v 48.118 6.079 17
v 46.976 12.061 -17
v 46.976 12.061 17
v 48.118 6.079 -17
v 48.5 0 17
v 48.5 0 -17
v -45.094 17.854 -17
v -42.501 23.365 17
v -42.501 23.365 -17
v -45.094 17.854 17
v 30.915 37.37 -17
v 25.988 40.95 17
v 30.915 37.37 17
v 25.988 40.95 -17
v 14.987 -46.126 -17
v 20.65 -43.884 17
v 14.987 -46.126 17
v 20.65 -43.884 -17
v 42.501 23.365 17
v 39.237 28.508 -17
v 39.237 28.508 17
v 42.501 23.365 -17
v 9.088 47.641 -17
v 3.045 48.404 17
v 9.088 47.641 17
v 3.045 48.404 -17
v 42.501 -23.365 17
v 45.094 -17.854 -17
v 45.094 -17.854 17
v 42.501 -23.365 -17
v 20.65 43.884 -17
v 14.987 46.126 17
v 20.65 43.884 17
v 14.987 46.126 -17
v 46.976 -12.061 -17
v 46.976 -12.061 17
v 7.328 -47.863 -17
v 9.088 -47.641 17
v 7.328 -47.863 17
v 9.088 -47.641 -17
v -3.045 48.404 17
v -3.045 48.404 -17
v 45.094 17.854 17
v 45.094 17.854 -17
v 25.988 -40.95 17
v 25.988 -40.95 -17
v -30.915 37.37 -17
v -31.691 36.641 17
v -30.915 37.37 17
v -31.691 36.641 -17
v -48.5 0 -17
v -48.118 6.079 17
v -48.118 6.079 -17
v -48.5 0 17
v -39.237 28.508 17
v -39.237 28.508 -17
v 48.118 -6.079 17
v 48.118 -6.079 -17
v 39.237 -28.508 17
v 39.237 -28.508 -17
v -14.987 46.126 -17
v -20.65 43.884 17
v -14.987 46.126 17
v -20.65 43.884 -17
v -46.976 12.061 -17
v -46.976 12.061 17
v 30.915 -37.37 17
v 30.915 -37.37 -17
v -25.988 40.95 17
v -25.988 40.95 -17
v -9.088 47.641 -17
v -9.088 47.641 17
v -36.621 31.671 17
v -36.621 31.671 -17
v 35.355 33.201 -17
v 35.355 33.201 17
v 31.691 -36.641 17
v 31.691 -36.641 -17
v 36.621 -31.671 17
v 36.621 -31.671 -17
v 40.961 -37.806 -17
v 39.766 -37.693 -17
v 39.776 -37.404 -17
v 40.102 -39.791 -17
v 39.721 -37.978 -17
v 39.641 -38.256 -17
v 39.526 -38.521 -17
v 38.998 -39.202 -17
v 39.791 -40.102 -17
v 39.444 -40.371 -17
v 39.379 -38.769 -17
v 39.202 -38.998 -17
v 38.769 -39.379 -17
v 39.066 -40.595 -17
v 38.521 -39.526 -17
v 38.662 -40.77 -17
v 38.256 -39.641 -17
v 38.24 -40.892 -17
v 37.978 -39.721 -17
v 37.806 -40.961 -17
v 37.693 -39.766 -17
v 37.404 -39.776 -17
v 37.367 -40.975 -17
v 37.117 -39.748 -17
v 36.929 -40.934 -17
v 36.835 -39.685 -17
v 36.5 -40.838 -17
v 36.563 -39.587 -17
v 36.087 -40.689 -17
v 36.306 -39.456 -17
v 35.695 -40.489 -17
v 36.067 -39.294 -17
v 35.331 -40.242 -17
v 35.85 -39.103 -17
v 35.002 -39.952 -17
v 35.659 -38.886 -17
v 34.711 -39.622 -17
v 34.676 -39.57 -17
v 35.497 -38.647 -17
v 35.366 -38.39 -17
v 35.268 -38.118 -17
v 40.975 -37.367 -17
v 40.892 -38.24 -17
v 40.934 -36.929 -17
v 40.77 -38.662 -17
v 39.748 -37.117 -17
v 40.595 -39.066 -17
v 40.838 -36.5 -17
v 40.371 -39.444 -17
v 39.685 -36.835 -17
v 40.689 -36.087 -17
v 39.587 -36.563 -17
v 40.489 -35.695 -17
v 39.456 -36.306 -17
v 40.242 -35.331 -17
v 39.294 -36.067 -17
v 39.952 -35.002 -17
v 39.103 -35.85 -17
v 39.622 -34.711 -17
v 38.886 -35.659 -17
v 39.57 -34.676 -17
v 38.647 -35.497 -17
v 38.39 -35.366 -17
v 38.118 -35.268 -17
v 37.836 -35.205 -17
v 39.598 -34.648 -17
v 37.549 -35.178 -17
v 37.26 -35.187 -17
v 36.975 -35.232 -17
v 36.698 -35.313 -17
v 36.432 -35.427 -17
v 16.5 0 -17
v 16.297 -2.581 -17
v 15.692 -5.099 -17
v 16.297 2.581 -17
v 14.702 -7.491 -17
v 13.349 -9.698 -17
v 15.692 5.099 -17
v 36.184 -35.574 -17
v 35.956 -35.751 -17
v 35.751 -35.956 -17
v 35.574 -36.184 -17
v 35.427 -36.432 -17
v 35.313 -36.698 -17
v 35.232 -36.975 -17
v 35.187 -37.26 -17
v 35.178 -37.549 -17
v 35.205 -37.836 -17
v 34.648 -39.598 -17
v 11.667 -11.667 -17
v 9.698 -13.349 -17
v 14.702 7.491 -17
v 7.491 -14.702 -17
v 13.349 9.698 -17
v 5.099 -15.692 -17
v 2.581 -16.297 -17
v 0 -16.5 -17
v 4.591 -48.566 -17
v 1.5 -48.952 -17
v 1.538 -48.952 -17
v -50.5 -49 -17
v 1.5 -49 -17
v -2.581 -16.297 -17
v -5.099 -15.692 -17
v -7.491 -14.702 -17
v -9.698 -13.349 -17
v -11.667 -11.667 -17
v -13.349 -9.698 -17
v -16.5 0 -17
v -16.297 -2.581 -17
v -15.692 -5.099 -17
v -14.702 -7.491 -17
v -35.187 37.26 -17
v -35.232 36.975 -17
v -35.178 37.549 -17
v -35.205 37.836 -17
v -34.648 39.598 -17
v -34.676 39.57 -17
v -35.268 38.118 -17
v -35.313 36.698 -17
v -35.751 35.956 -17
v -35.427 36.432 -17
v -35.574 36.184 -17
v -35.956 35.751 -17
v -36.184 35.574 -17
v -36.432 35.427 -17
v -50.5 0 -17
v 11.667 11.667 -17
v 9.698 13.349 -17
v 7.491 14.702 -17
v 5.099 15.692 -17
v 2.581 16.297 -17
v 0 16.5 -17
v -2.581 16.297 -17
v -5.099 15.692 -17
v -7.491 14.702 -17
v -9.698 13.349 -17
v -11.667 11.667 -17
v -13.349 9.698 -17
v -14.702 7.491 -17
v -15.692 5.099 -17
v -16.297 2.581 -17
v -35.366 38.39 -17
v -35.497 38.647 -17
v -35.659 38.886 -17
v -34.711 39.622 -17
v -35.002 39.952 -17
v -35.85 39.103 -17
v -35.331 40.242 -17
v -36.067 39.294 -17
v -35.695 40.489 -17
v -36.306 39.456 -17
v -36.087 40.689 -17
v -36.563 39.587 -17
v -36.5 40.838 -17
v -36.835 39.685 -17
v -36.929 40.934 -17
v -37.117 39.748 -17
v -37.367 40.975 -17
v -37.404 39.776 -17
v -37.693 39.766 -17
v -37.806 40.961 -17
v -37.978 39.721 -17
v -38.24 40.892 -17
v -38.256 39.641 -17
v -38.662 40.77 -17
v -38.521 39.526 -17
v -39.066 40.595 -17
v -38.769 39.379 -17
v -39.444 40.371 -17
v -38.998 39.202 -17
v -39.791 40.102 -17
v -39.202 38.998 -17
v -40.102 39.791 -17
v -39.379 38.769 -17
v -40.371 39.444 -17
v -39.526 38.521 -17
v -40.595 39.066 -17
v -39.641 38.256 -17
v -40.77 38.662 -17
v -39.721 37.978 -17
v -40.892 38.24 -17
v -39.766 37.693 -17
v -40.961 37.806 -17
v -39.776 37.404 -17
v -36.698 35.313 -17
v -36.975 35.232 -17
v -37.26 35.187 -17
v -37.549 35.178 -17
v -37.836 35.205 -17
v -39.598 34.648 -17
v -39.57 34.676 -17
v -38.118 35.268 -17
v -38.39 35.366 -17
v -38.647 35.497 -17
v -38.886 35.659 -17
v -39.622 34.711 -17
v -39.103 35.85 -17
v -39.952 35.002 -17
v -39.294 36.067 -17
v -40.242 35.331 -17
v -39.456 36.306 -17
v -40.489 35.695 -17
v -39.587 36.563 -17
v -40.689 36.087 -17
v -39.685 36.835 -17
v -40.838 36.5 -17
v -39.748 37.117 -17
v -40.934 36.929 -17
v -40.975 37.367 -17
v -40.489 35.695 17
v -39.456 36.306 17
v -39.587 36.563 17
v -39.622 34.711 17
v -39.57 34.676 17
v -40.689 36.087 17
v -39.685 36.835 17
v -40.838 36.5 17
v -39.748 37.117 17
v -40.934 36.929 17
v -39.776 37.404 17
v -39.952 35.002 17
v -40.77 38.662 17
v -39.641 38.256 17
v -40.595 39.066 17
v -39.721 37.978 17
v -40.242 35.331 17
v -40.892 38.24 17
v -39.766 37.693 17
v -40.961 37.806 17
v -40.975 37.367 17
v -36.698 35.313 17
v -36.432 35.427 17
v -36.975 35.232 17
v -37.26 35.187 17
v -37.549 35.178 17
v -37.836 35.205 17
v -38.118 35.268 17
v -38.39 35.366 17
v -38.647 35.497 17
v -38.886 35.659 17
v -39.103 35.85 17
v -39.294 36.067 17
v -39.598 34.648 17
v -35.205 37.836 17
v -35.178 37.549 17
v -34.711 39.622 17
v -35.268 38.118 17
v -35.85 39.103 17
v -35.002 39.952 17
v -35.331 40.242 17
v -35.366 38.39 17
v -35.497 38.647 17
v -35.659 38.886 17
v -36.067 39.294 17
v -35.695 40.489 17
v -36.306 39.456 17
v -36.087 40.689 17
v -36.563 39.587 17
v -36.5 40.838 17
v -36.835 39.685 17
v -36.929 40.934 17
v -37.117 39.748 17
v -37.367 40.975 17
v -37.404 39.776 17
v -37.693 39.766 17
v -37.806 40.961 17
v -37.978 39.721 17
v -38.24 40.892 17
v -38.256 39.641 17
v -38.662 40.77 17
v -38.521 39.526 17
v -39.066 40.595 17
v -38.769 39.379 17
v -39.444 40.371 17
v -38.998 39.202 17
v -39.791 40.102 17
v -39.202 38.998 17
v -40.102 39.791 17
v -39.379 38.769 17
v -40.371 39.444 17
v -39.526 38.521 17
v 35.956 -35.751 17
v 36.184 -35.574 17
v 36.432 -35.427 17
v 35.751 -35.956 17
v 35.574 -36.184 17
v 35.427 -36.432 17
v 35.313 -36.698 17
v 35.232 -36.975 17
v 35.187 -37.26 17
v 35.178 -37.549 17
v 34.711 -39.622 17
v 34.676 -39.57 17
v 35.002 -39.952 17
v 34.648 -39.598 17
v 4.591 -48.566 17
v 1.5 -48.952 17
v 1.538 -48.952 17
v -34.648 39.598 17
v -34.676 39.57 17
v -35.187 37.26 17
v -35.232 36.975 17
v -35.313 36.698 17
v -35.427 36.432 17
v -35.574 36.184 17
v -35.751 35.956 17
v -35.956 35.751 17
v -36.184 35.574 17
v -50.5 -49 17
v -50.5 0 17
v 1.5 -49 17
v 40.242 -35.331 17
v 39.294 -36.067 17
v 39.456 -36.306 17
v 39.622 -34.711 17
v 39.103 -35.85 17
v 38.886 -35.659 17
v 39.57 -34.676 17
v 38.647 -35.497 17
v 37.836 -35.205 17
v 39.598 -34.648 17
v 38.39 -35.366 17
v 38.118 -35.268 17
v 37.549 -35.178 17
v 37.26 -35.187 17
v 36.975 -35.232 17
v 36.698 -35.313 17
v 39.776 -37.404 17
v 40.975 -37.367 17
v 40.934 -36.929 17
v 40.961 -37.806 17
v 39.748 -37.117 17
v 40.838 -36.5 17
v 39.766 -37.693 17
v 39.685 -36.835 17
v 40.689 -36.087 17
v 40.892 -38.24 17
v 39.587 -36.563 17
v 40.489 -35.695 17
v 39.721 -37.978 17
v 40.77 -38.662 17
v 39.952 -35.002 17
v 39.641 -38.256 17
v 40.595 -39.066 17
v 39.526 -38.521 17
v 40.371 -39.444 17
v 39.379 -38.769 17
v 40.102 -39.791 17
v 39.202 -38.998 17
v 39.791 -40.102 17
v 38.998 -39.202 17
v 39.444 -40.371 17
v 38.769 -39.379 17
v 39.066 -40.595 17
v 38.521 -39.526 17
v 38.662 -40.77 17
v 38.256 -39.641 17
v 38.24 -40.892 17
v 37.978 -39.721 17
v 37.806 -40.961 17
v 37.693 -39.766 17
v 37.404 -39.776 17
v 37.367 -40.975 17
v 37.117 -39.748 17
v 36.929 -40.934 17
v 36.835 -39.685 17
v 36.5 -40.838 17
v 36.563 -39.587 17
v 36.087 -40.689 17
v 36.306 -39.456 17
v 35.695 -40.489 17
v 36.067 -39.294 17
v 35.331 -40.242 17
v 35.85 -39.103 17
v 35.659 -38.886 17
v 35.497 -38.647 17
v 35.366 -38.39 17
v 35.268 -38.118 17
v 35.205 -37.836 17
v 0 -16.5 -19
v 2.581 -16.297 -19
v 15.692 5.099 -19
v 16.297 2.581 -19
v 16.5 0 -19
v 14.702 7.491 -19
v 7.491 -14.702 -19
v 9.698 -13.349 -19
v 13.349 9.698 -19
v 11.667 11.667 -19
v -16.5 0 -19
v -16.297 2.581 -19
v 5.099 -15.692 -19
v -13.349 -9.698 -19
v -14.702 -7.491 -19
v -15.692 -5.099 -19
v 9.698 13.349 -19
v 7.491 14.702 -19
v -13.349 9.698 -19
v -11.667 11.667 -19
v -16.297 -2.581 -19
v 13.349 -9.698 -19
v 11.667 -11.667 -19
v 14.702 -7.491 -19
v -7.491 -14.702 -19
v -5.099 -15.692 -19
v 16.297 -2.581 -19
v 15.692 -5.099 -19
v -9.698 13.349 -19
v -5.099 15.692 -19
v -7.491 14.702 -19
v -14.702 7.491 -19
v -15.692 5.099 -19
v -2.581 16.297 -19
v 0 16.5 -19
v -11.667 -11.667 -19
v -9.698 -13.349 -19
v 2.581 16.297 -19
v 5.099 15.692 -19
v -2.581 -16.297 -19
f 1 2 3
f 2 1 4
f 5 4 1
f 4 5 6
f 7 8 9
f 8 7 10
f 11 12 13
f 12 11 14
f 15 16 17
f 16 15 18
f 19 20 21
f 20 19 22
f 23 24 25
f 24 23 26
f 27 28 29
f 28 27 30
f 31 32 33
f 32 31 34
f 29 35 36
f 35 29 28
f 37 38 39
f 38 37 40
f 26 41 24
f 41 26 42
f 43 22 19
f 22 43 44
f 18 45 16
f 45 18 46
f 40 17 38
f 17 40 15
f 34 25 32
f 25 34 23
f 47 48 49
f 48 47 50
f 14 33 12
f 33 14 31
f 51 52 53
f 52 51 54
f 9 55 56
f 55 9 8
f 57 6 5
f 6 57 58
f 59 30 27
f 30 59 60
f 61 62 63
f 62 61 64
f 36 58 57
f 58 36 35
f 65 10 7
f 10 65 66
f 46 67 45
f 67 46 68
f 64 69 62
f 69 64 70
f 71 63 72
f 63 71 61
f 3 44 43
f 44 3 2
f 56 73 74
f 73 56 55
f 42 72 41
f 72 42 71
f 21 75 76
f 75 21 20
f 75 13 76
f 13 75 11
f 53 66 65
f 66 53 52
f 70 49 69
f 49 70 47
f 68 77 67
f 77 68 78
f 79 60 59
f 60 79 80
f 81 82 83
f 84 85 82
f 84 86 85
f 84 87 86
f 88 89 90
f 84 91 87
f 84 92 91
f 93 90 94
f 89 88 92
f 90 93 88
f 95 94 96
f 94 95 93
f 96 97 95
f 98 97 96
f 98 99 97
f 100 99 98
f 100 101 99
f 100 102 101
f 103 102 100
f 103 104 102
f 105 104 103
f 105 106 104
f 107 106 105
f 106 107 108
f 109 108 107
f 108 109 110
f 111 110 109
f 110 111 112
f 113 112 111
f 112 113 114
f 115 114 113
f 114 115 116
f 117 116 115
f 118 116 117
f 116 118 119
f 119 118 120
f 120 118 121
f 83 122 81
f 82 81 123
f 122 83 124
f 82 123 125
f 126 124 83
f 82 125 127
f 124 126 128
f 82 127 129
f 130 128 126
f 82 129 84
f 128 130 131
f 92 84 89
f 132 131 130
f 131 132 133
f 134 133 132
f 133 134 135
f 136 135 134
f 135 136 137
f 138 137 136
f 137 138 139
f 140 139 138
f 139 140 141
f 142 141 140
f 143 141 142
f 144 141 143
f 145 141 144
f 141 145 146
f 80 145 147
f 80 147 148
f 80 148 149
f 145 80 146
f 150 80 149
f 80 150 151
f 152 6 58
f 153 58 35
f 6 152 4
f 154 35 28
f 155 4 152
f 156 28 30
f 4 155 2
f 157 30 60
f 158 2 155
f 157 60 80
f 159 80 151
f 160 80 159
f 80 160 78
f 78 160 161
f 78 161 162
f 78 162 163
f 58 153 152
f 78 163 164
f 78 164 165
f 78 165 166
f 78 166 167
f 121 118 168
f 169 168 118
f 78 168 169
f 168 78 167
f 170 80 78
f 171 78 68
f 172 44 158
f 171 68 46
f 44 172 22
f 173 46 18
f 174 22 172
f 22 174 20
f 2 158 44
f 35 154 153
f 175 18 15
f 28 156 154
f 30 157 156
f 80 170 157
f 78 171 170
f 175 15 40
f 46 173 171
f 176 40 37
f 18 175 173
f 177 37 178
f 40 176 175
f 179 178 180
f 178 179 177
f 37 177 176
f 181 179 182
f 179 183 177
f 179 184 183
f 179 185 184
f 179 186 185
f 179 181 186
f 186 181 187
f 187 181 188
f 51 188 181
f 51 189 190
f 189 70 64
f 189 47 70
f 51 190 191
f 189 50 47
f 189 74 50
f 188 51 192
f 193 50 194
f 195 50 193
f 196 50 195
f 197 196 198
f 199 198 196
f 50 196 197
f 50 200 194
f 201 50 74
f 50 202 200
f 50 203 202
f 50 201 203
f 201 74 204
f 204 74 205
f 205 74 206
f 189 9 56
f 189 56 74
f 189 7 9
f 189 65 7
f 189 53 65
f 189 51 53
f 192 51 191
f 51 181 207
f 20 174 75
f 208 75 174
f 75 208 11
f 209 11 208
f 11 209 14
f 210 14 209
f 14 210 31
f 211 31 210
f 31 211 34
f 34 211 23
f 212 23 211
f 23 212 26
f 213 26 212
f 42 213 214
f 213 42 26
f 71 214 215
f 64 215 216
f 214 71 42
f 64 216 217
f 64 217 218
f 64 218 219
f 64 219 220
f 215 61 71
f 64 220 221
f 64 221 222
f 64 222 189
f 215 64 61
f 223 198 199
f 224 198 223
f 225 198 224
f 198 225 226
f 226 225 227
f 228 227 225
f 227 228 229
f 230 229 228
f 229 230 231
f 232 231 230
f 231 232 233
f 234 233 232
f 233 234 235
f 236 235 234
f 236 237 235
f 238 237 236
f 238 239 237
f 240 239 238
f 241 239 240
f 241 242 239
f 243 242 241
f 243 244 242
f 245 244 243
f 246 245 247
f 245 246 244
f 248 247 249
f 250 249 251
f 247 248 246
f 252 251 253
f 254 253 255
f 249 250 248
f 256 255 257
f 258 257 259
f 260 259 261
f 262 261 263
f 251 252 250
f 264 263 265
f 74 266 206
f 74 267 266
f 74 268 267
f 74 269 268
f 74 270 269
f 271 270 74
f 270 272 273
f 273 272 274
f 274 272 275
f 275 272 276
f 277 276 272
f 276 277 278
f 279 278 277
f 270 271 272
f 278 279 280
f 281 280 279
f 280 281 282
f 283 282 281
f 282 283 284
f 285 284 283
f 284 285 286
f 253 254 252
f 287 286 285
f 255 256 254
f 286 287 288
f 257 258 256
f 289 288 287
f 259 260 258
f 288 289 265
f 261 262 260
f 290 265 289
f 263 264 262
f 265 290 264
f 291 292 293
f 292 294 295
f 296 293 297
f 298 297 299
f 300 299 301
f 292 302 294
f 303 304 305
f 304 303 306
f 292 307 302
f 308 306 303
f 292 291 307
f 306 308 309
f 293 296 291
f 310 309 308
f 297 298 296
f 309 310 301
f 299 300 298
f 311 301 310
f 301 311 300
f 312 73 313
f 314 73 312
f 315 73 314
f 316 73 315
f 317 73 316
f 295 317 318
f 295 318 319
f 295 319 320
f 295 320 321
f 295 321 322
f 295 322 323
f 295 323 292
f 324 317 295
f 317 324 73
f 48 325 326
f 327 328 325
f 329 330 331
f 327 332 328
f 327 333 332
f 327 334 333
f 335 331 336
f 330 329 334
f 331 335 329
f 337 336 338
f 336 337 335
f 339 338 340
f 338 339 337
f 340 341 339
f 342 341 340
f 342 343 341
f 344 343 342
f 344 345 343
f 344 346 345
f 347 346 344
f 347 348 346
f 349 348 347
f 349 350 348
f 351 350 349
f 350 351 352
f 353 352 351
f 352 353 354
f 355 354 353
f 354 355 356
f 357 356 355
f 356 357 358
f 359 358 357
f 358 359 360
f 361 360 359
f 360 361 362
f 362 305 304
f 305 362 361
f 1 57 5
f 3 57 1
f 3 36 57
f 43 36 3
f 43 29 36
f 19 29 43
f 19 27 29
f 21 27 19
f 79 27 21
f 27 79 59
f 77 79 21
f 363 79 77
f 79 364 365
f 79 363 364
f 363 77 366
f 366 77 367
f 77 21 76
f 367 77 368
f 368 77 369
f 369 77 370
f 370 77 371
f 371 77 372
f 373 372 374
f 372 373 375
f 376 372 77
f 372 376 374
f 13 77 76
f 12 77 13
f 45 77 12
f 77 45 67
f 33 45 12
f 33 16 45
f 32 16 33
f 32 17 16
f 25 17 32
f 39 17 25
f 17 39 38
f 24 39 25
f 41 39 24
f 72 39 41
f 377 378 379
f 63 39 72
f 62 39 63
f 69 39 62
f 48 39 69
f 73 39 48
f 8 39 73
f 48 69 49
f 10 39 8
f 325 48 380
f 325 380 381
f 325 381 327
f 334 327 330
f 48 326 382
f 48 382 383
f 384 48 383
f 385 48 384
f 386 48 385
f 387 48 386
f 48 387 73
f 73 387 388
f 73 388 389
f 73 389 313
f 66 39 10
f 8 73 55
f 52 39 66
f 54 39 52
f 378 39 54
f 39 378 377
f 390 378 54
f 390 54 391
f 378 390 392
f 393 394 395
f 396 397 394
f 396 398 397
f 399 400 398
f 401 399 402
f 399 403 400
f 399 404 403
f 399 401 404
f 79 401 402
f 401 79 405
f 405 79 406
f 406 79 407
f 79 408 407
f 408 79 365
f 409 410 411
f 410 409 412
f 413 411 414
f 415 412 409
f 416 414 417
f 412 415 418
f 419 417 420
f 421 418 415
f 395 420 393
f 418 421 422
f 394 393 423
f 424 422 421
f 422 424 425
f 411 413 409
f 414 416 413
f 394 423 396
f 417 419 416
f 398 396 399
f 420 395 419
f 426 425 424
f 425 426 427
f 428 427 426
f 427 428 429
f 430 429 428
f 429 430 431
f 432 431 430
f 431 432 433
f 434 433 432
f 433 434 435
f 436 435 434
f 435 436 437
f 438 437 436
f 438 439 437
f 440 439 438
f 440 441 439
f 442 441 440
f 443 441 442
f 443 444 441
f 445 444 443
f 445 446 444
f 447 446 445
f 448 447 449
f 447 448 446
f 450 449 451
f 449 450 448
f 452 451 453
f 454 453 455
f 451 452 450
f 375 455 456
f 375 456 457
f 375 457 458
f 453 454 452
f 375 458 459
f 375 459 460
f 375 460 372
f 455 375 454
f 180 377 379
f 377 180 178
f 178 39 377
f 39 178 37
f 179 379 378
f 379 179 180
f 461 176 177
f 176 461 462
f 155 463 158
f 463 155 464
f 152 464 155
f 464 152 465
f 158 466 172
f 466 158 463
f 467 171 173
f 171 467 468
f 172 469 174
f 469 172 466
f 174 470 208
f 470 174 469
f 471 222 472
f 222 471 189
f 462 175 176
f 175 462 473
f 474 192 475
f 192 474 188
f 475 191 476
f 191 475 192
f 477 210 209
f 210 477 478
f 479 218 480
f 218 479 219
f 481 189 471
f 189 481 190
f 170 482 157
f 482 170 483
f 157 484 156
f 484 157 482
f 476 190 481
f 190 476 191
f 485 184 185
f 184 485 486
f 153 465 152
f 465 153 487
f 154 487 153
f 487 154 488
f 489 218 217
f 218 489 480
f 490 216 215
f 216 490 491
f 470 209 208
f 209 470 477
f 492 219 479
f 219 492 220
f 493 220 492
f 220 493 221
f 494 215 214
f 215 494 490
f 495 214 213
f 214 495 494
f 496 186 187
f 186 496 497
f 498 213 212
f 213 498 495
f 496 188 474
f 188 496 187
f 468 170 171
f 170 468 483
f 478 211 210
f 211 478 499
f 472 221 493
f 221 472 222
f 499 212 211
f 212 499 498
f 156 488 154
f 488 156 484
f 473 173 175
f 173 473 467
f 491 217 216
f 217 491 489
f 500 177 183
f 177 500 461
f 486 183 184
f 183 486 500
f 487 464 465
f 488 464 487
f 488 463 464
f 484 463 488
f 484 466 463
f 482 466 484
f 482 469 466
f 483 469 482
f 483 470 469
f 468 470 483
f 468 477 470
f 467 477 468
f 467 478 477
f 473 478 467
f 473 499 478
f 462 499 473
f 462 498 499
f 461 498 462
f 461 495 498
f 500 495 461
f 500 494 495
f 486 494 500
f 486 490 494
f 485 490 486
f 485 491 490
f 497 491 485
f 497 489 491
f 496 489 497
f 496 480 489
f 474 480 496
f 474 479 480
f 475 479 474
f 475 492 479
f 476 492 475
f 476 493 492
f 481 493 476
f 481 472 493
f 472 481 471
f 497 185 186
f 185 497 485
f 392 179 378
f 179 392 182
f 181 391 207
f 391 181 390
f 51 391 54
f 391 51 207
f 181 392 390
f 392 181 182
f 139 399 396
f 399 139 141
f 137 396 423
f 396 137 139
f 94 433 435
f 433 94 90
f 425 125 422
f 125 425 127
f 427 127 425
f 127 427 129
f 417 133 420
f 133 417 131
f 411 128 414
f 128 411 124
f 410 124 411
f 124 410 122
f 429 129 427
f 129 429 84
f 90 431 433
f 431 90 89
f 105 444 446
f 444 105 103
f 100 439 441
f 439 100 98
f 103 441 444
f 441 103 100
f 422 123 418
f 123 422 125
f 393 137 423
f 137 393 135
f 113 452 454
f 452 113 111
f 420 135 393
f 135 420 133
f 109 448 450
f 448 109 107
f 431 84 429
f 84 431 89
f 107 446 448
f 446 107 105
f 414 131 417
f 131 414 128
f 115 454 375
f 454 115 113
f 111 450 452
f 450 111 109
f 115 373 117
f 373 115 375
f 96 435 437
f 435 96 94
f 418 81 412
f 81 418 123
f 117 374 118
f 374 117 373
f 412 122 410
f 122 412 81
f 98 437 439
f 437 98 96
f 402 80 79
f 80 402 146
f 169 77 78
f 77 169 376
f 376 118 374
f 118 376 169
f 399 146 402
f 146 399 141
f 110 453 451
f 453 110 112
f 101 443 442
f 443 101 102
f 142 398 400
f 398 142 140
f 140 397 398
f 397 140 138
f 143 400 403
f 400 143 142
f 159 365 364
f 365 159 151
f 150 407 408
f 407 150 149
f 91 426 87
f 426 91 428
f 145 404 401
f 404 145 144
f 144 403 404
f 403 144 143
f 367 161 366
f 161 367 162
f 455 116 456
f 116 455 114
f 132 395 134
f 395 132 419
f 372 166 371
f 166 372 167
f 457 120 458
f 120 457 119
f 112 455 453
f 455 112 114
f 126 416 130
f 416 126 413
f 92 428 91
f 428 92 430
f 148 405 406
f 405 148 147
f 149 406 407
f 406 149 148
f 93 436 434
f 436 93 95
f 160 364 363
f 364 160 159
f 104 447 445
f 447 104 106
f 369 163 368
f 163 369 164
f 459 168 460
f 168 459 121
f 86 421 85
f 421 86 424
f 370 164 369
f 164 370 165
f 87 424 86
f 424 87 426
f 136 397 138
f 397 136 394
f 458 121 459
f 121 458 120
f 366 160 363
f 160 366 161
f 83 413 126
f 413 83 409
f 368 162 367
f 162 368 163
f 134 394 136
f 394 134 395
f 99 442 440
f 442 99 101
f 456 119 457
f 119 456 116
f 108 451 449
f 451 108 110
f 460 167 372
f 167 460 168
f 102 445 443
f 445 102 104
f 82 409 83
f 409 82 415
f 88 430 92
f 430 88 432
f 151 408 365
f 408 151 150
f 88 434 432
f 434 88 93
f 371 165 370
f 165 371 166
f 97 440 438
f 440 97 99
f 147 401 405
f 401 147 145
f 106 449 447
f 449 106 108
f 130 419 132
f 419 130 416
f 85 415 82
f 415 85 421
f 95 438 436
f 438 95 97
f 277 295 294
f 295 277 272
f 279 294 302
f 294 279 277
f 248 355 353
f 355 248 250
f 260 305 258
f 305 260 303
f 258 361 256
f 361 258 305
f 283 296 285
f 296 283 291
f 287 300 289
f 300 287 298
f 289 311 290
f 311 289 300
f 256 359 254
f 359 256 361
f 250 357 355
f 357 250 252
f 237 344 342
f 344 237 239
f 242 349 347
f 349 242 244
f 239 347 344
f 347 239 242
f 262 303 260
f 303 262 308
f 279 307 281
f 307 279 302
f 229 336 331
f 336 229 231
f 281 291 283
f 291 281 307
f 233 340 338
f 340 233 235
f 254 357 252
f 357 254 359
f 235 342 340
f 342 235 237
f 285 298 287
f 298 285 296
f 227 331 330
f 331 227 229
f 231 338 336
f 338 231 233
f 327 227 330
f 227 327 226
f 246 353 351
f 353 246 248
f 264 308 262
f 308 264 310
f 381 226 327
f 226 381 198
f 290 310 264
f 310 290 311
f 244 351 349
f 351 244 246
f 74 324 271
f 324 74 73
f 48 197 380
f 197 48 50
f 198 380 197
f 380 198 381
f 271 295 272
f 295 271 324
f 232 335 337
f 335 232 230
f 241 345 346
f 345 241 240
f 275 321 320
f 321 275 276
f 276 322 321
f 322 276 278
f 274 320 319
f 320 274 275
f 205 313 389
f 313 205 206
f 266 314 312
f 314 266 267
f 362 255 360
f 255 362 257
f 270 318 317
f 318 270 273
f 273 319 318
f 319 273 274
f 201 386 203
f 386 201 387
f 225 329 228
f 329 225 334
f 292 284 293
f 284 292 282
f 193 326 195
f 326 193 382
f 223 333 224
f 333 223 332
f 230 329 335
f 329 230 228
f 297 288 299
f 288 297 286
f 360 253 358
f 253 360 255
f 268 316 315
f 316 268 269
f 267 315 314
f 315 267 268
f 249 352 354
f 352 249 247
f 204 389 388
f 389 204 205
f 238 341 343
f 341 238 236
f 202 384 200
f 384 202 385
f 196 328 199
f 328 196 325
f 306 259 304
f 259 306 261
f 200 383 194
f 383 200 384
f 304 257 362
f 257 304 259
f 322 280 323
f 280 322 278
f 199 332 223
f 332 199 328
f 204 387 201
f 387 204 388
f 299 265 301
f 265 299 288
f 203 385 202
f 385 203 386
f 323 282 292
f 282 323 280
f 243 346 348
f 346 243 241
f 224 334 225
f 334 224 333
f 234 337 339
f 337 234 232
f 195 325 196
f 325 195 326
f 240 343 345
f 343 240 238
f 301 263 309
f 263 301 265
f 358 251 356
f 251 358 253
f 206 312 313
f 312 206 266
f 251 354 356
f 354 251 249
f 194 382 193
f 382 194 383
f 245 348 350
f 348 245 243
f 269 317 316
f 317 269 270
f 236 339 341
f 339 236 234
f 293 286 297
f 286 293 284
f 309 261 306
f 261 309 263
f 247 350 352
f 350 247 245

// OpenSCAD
//Lüfter 12V Turbine 98x34

/* [Parameter] */
W = 98;
H = 34;

module body()
{
    $fn=50;
    cylinder(d=W-1,h=H,center=true);
    translate([0,-W/4,0])
    cylinder(d=W/2,h=H,center=true);
    translate([0,0,-2])
    cylinder(d=33,h=H,center=true, $fn=40);
}

module Lufter() 
{
    body();
    Auslass();
    rotate([0,0,-315])
    translate([0,-W/2-4,0])
    Befestigung();
    rotate([0,0,225])
    translate([0,-W/2-4,0])
    Befestigung();
}

module Auslass()
{
    translate([-W/4,-W/4,0])
    cube([W/2+3,W/2,H],center=true);
    Befestigung();
}

module Befestigung()
{
    $fn=50;
    difference()
    {
        union() 
        {
            cylinder(d=7,h=H,center=true);
            translate([0,4,0])
            cube([7,7,H],center=true);
        }
        cylinder(d=4.6,h=H+2,center=true);
    }

}
        
Lufter();
